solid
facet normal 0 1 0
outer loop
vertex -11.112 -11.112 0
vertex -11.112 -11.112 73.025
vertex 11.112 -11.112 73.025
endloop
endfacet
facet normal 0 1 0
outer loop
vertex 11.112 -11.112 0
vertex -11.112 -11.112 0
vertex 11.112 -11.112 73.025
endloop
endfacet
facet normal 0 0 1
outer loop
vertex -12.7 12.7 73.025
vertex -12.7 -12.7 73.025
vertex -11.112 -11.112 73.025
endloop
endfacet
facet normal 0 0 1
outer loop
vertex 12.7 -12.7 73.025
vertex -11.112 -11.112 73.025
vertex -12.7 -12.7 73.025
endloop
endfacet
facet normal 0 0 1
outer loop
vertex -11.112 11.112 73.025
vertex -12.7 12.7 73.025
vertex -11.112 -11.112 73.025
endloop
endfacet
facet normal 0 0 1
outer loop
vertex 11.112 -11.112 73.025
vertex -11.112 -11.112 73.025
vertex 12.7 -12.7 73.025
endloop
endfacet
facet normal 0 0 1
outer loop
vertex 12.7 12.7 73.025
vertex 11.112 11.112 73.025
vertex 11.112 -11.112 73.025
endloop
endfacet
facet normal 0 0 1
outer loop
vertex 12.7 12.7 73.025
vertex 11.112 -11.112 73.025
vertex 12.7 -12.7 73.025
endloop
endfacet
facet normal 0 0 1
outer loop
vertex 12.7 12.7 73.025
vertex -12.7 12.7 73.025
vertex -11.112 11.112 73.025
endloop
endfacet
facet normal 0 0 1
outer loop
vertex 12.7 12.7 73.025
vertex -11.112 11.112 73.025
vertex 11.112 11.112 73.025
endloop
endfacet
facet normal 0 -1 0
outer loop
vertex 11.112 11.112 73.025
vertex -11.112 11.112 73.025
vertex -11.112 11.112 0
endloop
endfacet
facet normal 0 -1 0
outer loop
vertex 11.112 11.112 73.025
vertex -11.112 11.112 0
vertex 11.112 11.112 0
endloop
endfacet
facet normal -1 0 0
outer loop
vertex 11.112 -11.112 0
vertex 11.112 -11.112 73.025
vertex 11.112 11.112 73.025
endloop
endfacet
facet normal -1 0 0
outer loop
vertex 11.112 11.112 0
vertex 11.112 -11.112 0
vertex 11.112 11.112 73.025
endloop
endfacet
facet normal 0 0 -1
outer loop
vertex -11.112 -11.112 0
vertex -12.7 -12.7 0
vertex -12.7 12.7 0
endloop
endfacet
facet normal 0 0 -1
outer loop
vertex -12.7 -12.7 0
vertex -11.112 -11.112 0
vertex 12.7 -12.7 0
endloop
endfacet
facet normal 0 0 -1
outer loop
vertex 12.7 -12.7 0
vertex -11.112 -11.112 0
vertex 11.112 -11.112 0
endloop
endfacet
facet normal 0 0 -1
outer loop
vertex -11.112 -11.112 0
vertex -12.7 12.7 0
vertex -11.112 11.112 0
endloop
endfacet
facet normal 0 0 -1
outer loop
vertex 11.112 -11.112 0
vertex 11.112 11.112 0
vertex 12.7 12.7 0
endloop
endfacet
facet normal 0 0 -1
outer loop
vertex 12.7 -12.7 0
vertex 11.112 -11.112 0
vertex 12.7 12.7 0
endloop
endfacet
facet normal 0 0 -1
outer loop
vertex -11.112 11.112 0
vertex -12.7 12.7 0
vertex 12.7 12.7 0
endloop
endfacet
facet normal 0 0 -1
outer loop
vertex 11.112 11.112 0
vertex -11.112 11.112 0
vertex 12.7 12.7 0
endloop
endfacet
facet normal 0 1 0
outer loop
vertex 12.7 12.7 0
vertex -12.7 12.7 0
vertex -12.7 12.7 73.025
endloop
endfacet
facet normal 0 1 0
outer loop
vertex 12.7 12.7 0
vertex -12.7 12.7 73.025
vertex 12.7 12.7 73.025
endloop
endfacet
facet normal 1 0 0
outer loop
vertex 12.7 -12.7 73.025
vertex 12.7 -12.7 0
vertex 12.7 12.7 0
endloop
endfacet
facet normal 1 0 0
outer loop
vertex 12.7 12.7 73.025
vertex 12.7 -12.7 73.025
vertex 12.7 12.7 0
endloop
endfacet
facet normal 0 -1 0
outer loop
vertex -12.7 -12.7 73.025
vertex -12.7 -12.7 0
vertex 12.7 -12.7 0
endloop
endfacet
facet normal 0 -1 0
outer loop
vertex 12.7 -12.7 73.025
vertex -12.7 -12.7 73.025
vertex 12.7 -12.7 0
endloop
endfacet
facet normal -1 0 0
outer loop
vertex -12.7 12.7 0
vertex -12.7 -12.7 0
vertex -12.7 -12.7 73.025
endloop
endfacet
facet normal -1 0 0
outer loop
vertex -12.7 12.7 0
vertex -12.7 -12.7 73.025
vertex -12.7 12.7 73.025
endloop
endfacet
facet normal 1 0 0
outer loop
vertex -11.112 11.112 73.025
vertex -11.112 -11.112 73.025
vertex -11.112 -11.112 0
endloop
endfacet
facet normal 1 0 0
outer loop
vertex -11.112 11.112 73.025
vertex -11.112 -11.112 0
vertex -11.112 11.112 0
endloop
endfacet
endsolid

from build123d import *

# Parameters (mm, degrees)
F1_W     = 25.4
F1_H     = 25.4
F2_DEPTH = 73.025
F3_T     = -1.5875
F4_DEPTH = 1.5885


# Not quite as in the source:
# - a variable given as a bare number and used for a length is read in inches; the dataset says mm whatever the document's units were


with BuildPart() as f2:
    # F1 (on Top) → F2 (new body)
    with BuildSketch(Plane.XY):
        Rectangle(F1_W, F1_H)
    extrude(amount=F2_DEPTH)

    # F3
    f3_openings = [f2.faces().sort_by_distance(p)[0] for p in [
        (0, 0, 73.025),
    ]]
    offset(amount=F3_T, openings=f3_openings)

    # F4 (cut, through all): a face of the model
    f4_faces = [f2.faces().sort_by_distance(p)[0] for p in [
        (0, 0, 1.5875),
    ]]
    extrude(f4_faces, amount=-F4_DEPTH, mode=Mode.SUBTRACT)


solid = f2.part
